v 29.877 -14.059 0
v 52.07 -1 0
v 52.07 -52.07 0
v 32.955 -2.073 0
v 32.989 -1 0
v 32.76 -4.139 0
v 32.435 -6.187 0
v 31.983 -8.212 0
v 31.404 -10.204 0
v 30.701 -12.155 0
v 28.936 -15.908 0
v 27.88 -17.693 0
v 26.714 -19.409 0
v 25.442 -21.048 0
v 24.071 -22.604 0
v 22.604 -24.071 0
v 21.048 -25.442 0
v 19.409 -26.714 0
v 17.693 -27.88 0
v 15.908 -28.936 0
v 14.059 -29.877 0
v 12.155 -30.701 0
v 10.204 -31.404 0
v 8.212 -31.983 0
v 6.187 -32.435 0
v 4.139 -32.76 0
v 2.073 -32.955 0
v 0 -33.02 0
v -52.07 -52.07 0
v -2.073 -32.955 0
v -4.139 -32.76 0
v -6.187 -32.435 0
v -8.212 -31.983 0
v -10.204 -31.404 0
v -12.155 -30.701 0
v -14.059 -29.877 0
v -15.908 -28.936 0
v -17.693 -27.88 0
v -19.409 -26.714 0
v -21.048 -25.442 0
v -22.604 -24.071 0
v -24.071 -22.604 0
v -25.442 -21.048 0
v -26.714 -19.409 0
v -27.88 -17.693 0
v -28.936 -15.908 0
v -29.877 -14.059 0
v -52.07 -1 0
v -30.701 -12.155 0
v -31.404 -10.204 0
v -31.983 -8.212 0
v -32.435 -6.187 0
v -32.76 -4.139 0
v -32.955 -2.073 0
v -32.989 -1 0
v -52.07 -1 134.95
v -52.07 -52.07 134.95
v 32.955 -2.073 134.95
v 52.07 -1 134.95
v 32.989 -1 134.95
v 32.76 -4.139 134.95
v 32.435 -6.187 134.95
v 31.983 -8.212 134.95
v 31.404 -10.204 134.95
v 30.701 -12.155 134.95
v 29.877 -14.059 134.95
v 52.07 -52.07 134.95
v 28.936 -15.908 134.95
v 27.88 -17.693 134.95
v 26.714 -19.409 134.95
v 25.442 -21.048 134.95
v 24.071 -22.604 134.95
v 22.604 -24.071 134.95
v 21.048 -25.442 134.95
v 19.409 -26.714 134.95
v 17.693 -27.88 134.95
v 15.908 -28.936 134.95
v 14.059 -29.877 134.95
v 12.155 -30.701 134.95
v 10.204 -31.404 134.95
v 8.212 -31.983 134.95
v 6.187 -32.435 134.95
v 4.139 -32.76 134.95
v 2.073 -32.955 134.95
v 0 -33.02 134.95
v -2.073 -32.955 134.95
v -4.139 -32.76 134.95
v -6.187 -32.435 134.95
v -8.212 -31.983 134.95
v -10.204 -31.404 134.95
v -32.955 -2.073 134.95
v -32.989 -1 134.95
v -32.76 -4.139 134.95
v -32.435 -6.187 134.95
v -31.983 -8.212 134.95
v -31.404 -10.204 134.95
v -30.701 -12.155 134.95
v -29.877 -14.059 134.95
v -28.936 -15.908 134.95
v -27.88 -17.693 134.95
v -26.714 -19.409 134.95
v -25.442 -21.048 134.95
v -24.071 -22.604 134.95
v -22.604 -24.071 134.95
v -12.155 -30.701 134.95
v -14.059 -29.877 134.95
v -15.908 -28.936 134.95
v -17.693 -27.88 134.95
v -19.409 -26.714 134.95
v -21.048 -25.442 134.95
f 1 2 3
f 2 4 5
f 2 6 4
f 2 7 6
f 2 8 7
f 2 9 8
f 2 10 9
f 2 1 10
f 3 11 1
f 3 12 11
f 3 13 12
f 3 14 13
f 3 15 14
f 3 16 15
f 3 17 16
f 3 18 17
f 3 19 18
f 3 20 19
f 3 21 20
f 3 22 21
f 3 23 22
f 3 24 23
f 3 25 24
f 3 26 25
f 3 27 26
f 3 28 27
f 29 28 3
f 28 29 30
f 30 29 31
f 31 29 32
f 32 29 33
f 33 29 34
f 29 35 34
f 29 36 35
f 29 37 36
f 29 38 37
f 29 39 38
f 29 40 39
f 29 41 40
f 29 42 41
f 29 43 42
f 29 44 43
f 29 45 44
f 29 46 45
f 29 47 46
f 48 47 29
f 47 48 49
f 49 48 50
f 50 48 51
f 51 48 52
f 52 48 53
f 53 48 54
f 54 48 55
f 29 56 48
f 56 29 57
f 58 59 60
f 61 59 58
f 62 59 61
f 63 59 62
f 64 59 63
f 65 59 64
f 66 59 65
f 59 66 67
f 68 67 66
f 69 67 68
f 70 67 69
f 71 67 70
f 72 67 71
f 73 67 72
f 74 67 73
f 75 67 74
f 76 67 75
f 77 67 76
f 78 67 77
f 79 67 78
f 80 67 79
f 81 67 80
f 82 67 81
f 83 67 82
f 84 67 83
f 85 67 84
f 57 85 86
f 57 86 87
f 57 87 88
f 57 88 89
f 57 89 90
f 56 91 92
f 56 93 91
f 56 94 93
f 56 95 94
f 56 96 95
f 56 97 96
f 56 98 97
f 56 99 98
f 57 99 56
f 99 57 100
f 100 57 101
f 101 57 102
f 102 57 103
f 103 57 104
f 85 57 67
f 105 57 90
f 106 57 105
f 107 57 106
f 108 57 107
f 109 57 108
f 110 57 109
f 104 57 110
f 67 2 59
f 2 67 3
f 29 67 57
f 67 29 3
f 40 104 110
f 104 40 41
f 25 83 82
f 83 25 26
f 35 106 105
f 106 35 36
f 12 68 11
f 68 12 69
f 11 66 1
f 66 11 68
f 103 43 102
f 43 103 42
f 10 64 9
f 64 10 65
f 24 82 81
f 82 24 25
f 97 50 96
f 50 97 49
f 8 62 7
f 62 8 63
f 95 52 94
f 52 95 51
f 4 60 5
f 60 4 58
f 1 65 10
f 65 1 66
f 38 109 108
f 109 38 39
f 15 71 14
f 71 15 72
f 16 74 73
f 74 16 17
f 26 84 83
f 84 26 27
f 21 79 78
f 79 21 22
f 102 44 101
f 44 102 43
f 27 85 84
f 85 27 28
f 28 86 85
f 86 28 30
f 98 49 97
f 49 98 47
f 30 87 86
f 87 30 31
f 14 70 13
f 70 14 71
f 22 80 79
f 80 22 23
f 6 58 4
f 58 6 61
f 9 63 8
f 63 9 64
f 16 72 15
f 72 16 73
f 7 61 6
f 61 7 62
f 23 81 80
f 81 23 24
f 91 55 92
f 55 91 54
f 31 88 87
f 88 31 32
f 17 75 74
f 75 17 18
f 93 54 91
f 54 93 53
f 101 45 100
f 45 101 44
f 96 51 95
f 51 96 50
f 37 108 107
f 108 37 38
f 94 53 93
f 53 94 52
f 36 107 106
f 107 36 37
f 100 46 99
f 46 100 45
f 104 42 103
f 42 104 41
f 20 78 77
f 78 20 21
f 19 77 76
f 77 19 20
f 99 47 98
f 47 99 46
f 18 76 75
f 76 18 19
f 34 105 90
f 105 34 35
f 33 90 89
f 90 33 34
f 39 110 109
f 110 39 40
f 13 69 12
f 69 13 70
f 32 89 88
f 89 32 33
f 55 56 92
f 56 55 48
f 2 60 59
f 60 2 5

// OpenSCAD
// file: can_extrusion.scad
CAN_DIAMETER_WIDEST=66.04; //2.60 inches
CAN_RADIUS_WIDEST=CAN_DIAMETER_WIDEST/2;
CAN_HEIGHT=122.682; //4.83 inches
CAN_EXTRUDED_HEIGHT=CAN_HEIGHT + 20;

module can_extrusion() {
    cylinder(r=CAN_RADIUS_WIDEST, h=CAN_EXTRUDED_HEIGHT, $fn=100);
}
// main file
include <can_extrusion.scad>

INCH_MM=25.4;
COOLER_WIDTH=CAN_DIAMETER_WIDEST + 1.5*INCH_MM; //add 1.5 inches all around.
COOLER_HEIGHT=CAN_HEIGHT + (CAN_HEIGHT*0.10);

module cooler() {
    difference() {
        union() {
            linear_extrude(height=COOLER_HEIGHT) {
                square(COOLER_WIDTH, center=true);
            }
        }

        union() {
            translate([0,0,-5]) can_extrusion();
        }
    }
}

module cooler_half() {
    difference() {
        union() {
            cooler();
        }

        union() {
            translate([0,COOLER_WIDTH / 2,-2]) {
                linear_extrude(height=COOLER_HEIGHT + 4) {
                    square(COOLER_WIDTH + 2, center=true);
                }
            }
        }
    }
}

rotate ([$t*360,0,0]) cooler_half();
